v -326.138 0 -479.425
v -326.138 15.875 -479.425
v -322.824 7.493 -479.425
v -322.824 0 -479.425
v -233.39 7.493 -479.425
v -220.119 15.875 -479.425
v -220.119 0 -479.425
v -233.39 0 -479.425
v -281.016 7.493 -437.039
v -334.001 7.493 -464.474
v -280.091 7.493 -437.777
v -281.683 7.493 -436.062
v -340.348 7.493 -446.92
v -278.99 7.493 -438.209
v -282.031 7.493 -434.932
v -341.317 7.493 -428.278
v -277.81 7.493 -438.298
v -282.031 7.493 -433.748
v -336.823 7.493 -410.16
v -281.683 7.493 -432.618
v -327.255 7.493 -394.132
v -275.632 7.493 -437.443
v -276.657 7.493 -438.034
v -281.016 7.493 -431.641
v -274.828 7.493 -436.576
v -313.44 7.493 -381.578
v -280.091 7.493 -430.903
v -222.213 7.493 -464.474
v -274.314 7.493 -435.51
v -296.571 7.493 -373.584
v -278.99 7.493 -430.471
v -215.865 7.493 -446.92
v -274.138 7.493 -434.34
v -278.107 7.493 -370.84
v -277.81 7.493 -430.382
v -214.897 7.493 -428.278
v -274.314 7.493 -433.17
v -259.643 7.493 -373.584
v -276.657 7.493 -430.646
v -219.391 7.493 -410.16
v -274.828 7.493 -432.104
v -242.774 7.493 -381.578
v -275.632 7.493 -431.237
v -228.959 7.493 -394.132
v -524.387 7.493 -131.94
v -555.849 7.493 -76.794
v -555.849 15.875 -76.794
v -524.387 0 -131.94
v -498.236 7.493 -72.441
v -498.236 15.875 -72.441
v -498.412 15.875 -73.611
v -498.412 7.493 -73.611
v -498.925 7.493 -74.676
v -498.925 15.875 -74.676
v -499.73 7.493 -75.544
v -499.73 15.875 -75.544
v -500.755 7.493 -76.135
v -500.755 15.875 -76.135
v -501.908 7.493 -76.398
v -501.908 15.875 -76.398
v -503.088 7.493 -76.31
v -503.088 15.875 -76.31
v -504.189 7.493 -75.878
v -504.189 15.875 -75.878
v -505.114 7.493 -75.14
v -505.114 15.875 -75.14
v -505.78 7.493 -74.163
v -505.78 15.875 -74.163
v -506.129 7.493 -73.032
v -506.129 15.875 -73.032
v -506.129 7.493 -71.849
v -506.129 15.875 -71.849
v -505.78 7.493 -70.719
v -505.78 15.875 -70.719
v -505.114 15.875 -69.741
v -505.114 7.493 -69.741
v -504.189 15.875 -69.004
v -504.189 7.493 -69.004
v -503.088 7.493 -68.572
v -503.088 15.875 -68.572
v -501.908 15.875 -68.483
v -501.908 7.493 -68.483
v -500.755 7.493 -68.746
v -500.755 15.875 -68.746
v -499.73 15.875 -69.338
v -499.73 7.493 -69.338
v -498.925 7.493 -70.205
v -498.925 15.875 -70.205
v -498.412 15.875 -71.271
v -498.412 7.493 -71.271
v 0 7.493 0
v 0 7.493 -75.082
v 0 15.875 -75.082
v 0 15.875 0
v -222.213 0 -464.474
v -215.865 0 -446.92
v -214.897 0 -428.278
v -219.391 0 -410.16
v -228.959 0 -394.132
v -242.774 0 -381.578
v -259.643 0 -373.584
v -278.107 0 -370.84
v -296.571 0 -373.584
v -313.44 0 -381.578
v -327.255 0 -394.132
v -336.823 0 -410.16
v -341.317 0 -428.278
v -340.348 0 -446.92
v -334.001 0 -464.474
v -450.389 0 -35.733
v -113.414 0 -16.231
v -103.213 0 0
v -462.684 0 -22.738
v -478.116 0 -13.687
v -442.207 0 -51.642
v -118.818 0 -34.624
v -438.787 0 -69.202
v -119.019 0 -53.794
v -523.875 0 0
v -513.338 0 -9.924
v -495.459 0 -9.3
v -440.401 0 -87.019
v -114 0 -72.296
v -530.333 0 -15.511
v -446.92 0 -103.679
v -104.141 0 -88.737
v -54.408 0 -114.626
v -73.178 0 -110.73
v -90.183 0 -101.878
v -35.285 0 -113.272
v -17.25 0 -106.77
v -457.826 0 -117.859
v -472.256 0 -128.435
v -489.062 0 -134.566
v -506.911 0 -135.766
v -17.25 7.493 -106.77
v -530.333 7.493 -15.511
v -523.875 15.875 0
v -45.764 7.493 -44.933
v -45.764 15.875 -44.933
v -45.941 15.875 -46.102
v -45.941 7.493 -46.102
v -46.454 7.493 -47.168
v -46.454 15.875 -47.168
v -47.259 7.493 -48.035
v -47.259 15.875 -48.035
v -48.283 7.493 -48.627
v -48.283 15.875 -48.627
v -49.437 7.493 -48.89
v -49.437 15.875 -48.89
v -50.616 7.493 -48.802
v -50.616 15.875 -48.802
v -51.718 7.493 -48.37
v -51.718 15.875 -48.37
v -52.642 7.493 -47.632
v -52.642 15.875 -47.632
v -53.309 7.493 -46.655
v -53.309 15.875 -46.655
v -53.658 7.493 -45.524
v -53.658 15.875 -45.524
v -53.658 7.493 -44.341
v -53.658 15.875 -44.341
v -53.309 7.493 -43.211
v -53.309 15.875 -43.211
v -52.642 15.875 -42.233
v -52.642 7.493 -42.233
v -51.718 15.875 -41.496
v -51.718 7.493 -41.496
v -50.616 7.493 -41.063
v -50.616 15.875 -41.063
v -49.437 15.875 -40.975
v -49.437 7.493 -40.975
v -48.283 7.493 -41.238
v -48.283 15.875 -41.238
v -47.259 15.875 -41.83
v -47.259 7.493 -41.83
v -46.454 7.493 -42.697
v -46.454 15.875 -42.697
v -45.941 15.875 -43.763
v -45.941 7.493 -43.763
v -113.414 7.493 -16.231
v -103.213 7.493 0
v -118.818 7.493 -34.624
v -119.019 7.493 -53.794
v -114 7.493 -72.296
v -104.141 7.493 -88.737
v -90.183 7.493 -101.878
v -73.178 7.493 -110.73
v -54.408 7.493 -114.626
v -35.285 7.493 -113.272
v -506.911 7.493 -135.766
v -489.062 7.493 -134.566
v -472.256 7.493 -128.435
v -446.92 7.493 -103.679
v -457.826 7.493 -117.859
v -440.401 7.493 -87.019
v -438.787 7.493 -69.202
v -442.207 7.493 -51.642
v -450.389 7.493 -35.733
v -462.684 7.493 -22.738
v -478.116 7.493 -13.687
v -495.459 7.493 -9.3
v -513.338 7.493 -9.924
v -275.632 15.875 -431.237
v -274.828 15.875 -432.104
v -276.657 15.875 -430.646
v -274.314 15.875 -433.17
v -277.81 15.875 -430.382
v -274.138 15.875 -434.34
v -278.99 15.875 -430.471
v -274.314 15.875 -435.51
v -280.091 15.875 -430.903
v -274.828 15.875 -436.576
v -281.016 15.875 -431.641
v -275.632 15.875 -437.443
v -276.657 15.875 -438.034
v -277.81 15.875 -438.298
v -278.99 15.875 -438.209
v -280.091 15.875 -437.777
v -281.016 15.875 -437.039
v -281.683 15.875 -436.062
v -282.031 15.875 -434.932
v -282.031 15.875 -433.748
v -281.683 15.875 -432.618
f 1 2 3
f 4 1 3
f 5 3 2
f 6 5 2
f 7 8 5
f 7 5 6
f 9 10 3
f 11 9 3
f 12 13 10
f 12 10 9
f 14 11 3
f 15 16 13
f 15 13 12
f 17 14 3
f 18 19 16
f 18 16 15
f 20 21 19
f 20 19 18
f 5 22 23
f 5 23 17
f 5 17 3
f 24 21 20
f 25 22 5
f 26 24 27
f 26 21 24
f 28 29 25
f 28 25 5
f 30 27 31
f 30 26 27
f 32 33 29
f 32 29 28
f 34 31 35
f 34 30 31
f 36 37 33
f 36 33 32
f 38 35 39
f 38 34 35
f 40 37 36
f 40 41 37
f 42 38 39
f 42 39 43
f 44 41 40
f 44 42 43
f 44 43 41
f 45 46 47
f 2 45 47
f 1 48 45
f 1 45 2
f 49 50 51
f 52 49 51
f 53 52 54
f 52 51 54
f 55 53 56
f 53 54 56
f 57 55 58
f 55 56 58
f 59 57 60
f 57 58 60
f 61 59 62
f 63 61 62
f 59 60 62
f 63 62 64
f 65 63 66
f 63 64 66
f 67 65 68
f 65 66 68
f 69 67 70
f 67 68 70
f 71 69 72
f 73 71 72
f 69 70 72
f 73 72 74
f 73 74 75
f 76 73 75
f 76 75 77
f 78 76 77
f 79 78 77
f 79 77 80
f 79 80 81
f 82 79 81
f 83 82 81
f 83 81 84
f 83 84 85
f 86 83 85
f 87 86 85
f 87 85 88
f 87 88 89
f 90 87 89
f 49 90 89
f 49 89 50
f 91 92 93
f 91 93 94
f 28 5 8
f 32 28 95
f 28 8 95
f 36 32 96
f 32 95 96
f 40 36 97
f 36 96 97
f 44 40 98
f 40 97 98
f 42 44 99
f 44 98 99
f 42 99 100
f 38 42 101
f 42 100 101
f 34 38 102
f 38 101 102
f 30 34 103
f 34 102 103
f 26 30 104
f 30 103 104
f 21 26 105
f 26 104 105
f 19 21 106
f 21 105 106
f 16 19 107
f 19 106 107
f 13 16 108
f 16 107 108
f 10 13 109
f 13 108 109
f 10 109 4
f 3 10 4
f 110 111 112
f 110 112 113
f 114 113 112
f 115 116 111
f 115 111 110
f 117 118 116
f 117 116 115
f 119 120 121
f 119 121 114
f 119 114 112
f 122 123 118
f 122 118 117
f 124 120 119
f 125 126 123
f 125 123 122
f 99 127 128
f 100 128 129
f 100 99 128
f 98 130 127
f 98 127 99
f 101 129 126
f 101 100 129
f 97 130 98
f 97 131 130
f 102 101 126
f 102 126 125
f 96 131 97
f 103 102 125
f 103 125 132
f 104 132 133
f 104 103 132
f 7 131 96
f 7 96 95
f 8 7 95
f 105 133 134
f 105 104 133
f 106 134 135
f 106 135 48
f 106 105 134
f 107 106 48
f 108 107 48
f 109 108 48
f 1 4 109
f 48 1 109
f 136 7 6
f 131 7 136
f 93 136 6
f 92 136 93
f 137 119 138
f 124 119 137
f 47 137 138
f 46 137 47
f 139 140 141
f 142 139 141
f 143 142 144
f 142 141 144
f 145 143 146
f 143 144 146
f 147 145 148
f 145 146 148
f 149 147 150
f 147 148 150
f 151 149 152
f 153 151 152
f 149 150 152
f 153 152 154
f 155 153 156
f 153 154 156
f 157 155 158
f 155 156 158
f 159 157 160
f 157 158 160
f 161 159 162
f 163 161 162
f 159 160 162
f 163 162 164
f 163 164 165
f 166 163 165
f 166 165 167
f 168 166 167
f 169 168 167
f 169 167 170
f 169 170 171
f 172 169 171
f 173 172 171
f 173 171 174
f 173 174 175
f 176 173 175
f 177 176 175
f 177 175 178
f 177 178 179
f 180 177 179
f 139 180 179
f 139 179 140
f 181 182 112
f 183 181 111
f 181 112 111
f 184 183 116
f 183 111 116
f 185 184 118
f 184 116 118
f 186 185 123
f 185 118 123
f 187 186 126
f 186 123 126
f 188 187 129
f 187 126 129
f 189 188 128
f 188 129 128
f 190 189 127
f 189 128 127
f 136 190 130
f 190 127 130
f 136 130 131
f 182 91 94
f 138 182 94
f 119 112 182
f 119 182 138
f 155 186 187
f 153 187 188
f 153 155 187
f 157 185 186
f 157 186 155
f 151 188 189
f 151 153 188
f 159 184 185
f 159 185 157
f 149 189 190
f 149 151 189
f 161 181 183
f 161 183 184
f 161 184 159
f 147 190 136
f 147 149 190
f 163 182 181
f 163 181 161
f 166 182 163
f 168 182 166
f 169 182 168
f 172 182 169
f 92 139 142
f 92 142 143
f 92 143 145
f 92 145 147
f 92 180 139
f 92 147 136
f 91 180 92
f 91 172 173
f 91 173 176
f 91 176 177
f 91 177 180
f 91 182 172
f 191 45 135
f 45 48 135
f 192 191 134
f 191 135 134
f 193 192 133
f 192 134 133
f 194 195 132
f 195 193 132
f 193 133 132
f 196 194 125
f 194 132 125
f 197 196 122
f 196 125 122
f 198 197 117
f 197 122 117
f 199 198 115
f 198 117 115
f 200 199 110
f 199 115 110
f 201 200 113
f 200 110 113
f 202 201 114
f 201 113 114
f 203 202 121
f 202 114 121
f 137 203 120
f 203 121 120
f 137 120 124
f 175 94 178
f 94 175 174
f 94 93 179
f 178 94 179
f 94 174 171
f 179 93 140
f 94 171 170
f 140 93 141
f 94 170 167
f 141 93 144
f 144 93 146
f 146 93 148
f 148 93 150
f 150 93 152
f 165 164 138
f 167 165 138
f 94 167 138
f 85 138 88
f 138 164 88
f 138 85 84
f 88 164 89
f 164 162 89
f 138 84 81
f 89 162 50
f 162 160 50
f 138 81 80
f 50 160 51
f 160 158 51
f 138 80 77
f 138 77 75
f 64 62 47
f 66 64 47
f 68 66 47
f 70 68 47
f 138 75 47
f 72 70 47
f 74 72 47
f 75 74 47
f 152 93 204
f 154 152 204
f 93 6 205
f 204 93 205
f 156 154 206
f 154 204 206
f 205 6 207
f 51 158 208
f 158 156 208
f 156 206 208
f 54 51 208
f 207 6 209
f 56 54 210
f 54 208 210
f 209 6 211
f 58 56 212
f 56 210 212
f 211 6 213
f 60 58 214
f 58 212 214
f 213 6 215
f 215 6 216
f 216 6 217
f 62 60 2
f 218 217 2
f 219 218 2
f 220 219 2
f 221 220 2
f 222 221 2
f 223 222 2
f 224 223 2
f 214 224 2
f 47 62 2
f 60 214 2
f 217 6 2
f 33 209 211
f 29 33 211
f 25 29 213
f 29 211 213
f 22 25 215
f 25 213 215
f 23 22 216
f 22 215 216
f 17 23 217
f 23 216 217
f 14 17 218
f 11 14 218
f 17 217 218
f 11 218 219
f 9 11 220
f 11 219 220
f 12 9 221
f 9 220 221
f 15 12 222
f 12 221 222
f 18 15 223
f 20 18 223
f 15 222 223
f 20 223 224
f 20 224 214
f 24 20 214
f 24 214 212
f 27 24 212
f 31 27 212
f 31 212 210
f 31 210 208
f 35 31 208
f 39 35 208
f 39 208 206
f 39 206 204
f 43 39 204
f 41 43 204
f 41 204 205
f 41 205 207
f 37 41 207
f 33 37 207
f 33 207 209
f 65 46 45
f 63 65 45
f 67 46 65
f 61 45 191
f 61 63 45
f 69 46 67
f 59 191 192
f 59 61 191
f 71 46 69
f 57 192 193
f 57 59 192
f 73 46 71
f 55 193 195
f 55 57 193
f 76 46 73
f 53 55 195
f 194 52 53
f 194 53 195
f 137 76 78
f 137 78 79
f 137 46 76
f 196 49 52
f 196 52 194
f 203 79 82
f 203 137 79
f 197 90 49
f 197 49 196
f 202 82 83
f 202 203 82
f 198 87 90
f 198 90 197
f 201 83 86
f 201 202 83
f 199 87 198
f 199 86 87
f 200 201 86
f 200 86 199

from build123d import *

# Parameters (mm, degrees)
BOSS_EXTRUDE1_DEPTH = 15.875
SKETCH2_R           = 3.96875
CUT_EXTRUDE1_DEPTH  = 16.875
SKETCH3_R           = 63.5
SKETCH3_R_2         = 69.85
CUT_EXTRUDE2_DEPTH  = 7.493


with BuildPart() as part:
    # Sketch1 → Boss-Extrude1 (new body)
    with BuildSketch(Plane(origin=(0, 0, 0), x_dir=(1, 0, 0), z_dir=(0, 1, 0))):
        Polygon((0, 0), (-523.875, 0), (-555.849378124, 76.79442277), (-326.138209959, 479.425), (-220.118609959, 479.425), (0, 75.0824), align=None)
    extrude(amount=BOSS_EXTRUDE1_DEPTH)

    # Sketch2 → Cut-Extrude1 (cut, through all)
    with BuildSketch(Plane(origin=(0, 15.875, 0), x_dir=(1, 0, 0), z_dir=(0, 1, 0))):
        with Locations((-278.106809959, 434.34)):
            Circle(SKETCH2_R)
        with Locations((-502.204578124, 72.4408)):
            Circle(SKETCH2_R)
        with Locations((-49.7332, 44.9326)):
            Circle(SKETCH2_R)
    extrude(amount=-CUT_EXTRUDE1_DEPTH, mode=Mode.SUBTRACT)

    # Sketch3 → Cut-Extrude2 (cut)
    with BuildSketch(Plane.XZ):
        with Locations((-502.204578124, -72.4408)):
            Circle(SKETCH3_R)
        with Locations((-49.7332, -44.9326)):
            Circle(SKETCH3_R_2)
        with Locations((-278.106809959, -434.34)):
            Circle(SKETCH3_R)
    extrude(amount=-CUT_EXTRUDE2_DEPTH, mode=Mode.SUBTRACT)


solid = part.part
